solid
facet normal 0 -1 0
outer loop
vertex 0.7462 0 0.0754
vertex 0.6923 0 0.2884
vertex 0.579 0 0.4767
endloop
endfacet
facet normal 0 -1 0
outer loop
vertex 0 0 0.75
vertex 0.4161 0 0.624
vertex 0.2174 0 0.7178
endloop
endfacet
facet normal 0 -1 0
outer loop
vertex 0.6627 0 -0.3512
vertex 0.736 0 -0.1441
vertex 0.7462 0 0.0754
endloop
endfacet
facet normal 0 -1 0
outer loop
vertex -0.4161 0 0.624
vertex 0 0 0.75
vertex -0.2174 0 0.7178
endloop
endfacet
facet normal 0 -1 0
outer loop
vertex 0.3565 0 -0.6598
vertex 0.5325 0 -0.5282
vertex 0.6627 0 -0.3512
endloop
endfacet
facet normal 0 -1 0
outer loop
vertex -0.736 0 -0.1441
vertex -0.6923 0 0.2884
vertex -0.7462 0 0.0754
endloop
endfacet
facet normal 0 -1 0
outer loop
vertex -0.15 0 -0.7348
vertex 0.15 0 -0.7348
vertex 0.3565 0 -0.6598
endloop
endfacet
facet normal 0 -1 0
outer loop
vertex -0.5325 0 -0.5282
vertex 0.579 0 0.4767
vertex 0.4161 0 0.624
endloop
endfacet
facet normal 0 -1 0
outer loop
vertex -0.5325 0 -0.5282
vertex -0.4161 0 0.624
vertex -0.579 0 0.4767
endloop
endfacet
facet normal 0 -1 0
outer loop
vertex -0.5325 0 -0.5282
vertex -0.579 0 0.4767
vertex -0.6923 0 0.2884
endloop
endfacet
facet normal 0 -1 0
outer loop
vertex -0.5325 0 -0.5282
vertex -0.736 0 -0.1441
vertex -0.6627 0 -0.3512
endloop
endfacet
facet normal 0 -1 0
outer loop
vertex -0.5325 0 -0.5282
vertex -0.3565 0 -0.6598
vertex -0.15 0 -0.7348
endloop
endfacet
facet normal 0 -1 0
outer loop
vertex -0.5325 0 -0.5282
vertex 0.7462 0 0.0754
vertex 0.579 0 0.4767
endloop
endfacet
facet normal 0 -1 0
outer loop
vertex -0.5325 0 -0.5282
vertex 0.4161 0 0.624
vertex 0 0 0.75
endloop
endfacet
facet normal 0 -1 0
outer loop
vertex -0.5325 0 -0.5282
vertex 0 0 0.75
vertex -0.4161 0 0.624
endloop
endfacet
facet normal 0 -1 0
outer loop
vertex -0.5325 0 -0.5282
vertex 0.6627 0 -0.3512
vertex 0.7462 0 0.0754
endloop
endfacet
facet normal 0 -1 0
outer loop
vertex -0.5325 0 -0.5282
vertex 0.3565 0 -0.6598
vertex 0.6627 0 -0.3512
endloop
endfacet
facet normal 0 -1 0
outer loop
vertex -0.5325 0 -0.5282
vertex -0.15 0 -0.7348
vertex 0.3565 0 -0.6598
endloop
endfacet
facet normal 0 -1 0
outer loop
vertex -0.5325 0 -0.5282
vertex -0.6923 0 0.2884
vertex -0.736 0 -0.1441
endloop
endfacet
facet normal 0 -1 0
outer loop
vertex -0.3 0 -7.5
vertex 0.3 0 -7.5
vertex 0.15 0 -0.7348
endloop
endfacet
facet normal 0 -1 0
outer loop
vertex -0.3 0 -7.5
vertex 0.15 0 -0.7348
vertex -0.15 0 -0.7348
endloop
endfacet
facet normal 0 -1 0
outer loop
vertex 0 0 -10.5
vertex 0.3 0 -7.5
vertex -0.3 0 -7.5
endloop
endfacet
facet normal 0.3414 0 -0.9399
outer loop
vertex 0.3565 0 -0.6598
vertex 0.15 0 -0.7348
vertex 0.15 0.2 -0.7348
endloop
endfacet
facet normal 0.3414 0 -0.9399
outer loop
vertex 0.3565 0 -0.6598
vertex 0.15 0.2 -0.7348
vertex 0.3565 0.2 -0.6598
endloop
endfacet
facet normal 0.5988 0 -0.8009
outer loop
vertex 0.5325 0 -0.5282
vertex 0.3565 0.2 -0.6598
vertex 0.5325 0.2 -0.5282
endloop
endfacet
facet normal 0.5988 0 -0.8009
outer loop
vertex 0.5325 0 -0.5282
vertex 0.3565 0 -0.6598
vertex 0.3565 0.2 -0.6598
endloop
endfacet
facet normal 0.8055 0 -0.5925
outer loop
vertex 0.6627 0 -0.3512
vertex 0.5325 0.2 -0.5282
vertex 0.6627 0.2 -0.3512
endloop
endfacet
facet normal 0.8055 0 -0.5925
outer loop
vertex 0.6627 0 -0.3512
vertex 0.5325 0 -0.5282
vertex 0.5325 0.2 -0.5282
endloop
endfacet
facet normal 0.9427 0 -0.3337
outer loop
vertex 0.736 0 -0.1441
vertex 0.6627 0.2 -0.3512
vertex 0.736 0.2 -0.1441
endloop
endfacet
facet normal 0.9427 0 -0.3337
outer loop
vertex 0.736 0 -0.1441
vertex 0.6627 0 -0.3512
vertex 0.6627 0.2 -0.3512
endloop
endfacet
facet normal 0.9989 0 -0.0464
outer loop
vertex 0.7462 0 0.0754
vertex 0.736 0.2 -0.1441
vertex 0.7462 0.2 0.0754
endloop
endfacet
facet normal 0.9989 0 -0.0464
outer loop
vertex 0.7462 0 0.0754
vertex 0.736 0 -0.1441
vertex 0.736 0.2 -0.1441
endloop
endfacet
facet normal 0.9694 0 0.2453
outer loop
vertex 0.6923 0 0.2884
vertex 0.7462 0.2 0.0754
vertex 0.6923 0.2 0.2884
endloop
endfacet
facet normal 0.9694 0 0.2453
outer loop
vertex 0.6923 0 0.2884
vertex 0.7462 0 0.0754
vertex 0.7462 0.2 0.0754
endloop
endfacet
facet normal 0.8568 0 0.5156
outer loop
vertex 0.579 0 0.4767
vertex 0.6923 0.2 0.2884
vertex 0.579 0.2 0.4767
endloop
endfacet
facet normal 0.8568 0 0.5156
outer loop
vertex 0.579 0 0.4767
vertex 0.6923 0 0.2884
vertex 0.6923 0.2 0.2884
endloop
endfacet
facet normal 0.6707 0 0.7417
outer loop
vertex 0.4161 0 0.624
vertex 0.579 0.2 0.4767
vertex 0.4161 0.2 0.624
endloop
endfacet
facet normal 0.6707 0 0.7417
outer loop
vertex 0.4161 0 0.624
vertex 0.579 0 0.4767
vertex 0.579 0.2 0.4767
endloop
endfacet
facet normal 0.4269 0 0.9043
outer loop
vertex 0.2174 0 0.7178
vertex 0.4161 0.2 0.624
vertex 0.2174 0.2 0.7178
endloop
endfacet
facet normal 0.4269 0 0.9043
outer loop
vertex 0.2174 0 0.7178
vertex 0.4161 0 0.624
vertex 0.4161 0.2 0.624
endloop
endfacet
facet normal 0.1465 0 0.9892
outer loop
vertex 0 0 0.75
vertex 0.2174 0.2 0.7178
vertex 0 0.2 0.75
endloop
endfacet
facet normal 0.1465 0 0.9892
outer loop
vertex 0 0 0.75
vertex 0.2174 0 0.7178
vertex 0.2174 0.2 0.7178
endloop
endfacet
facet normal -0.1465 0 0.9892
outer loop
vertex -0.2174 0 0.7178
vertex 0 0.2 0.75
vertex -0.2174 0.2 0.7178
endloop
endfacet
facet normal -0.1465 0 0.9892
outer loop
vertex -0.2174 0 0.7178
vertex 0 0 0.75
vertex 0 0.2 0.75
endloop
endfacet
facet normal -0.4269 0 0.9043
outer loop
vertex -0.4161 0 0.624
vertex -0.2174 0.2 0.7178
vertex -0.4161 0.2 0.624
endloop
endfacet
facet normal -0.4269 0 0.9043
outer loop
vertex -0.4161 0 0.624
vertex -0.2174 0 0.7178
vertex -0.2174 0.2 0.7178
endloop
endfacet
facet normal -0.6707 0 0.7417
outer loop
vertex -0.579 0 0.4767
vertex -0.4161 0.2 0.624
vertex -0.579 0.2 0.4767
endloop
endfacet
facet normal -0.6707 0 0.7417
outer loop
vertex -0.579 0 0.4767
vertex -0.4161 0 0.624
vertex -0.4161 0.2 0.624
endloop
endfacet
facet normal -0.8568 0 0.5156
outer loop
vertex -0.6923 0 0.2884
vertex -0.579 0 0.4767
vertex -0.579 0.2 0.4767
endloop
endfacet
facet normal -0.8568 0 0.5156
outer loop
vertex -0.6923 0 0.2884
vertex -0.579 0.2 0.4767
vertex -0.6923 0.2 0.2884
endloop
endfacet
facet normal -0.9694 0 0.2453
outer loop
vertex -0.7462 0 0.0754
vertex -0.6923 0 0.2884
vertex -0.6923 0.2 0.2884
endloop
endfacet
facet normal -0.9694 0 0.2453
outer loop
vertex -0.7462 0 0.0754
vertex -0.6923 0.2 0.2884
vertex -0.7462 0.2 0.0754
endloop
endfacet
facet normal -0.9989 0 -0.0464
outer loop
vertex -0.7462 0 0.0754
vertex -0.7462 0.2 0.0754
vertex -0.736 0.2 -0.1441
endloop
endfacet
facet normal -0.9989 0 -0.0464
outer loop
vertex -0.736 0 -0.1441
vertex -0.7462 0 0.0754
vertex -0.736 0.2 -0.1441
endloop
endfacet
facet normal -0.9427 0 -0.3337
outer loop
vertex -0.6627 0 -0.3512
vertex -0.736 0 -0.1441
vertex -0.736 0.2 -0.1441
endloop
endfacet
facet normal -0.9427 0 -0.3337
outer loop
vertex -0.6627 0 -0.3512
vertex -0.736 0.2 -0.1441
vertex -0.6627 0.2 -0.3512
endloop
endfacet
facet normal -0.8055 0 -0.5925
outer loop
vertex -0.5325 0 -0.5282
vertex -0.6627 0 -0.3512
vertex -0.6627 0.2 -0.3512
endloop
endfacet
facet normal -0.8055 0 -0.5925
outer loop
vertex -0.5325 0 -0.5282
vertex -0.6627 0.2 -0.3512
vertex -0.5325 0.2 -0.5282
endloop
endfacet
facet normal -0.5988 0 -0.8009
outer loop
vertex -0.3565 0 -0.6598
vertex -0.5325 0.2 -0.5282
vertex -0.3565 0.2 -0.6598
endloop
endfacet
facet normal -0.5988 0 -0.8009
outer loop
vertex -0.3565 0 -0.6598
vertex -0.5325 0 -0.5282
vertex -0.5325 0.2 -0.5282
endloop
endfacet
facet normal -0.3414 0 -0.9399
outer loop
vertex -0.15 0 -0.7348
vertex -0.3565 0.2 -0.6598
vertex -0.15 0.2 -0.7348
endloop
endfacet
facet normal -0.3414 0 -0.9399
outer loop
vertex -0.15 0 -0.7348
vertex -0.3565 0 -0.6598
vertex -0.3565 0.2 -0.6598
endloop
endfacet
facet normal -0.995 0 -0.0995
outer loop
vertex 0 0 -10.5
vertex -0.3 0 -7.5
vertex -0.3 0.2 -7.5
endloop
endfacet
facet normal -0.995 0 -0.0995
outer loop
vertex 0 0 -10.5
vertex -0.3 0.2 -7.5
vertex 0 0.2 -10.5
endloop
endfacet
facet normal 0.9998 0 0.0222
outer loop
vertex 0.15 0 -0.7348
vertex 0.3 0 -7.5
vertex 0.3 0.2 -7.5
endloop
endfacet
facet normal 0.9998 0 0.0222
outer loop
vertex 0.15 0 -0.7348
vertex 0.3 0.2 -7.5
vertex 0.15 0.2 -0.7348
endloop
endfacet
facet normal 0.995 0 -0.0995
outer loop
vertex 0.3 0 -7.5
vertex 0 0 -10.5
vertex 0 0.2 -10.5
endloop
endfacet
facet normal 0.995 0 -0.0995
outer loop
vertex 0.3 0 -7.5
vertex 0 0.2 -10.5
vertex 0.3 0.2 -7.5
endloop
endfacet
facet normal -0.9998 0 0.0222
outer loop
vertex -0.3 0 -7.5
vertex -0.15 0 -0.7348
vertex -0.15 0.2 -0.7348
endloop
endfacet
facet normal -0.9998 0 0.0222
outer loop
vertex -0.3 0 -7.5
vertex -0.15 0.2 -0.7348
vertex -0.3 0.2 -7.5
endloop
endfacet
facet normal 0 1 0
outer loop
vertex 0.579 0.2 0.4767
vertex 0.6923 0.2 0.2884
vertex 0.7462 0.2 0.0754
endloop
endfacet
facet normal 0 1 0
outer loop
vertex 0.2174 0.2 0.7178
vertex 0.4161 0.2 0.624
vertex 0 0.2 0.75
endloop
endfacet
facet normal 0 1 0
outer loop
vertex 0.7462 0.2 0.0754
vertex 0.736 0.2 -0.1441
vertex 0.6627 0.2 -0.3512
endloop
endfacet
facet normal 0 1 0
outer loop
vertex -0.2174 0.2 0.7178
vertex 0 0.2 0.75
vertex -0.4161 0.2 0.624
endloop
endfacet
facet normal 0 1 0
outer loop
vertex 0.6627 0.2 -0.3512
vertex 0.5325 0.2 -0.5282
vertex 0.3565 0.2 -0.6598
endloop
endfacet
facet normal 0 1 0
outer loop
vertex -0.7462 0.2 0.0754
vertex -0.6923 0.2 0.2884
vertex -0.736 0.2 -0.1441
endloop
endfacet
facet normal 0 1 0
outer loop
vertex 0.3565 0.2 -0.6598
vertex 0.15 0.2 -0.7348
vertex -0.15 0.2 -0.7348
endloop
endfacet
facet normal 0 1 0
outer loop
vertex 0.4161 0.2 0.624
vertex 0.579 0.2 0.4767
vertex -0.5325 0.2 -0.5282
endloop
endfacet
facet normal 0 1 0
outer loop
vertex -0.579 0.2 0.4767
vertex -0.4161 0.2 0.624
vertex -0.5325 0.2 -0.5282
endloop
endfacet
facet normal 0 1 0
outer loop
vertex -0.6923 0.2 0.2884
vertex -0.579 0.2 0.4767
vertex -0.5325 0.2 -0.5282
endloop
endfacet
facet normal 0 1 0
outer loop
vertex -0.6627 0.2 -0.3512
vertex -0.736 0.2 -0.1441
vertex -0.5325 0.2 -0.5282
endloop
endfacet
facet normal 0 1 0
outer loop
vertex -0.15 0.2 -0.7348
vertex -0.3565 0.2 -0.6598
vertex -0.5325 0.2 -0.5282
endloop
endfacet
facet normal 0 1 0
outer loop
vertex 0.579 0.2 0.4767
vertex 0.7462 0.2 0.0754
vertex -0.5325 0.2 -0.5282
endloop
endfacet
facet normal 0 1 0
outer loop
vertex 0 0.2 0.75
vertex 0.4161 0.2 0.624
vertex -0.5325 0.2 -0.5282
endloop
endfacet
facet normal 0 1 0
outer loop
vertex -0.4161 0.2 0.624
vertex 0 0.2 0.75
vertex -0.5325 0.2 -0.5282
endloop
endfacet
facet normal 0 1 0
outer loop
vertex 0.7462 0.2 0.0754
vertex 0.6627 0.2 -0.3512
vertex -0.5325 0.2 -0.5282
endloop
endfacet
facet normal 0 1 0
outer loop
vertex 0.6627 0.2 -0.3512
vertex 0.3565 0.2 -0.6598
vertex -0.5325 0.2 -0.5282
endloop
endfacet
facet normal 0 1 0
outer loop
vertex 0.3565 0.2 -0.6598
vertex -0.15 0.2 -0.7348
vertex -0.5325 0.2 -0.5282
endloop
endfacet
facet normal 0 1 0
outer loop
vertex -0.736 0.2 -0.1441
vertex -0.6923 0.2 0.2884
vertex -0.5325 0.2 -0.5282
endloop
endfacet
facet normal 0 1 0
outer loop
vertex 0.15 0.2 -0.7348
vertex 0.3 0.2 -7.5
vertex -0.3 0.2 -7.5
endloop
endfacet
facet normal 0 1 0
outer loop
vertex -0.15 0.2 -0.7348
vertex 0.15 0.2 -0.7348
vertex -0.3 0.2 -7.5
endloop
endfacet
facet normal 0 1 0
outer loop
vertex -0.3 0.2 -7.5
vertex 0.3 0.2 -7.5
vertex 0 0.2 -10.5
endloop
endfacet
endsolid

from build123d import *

# Parameters (mm, degrees)
EXTRUDE1_DEPTH = 0.2


with BuildPart() as part:
    # Sketch1 → Extrude1 (new body)
    with BuildSketch(Plane(origin=(0, 0, 0), x_dir=(1, 0, 0), z_dir=(0, 1, 0))):
        with BuildLine():
            Line((0, 10.5), (0.3, 7.5))
            Line((0.3, 7.5), (0.15, 0.734846923))
            ThreePointArc((0.15, 0.734846923), (0, -0.75), (-0.15, 0.734846923))
            Line((-0.15, 0.734846923), (-0.3, 7.5))
            Line((-0.3, 7.5), (0, 10.5))
        make_face()
    extrude(amount=EXTRUDE1_DEPTH)


solid = part.part
